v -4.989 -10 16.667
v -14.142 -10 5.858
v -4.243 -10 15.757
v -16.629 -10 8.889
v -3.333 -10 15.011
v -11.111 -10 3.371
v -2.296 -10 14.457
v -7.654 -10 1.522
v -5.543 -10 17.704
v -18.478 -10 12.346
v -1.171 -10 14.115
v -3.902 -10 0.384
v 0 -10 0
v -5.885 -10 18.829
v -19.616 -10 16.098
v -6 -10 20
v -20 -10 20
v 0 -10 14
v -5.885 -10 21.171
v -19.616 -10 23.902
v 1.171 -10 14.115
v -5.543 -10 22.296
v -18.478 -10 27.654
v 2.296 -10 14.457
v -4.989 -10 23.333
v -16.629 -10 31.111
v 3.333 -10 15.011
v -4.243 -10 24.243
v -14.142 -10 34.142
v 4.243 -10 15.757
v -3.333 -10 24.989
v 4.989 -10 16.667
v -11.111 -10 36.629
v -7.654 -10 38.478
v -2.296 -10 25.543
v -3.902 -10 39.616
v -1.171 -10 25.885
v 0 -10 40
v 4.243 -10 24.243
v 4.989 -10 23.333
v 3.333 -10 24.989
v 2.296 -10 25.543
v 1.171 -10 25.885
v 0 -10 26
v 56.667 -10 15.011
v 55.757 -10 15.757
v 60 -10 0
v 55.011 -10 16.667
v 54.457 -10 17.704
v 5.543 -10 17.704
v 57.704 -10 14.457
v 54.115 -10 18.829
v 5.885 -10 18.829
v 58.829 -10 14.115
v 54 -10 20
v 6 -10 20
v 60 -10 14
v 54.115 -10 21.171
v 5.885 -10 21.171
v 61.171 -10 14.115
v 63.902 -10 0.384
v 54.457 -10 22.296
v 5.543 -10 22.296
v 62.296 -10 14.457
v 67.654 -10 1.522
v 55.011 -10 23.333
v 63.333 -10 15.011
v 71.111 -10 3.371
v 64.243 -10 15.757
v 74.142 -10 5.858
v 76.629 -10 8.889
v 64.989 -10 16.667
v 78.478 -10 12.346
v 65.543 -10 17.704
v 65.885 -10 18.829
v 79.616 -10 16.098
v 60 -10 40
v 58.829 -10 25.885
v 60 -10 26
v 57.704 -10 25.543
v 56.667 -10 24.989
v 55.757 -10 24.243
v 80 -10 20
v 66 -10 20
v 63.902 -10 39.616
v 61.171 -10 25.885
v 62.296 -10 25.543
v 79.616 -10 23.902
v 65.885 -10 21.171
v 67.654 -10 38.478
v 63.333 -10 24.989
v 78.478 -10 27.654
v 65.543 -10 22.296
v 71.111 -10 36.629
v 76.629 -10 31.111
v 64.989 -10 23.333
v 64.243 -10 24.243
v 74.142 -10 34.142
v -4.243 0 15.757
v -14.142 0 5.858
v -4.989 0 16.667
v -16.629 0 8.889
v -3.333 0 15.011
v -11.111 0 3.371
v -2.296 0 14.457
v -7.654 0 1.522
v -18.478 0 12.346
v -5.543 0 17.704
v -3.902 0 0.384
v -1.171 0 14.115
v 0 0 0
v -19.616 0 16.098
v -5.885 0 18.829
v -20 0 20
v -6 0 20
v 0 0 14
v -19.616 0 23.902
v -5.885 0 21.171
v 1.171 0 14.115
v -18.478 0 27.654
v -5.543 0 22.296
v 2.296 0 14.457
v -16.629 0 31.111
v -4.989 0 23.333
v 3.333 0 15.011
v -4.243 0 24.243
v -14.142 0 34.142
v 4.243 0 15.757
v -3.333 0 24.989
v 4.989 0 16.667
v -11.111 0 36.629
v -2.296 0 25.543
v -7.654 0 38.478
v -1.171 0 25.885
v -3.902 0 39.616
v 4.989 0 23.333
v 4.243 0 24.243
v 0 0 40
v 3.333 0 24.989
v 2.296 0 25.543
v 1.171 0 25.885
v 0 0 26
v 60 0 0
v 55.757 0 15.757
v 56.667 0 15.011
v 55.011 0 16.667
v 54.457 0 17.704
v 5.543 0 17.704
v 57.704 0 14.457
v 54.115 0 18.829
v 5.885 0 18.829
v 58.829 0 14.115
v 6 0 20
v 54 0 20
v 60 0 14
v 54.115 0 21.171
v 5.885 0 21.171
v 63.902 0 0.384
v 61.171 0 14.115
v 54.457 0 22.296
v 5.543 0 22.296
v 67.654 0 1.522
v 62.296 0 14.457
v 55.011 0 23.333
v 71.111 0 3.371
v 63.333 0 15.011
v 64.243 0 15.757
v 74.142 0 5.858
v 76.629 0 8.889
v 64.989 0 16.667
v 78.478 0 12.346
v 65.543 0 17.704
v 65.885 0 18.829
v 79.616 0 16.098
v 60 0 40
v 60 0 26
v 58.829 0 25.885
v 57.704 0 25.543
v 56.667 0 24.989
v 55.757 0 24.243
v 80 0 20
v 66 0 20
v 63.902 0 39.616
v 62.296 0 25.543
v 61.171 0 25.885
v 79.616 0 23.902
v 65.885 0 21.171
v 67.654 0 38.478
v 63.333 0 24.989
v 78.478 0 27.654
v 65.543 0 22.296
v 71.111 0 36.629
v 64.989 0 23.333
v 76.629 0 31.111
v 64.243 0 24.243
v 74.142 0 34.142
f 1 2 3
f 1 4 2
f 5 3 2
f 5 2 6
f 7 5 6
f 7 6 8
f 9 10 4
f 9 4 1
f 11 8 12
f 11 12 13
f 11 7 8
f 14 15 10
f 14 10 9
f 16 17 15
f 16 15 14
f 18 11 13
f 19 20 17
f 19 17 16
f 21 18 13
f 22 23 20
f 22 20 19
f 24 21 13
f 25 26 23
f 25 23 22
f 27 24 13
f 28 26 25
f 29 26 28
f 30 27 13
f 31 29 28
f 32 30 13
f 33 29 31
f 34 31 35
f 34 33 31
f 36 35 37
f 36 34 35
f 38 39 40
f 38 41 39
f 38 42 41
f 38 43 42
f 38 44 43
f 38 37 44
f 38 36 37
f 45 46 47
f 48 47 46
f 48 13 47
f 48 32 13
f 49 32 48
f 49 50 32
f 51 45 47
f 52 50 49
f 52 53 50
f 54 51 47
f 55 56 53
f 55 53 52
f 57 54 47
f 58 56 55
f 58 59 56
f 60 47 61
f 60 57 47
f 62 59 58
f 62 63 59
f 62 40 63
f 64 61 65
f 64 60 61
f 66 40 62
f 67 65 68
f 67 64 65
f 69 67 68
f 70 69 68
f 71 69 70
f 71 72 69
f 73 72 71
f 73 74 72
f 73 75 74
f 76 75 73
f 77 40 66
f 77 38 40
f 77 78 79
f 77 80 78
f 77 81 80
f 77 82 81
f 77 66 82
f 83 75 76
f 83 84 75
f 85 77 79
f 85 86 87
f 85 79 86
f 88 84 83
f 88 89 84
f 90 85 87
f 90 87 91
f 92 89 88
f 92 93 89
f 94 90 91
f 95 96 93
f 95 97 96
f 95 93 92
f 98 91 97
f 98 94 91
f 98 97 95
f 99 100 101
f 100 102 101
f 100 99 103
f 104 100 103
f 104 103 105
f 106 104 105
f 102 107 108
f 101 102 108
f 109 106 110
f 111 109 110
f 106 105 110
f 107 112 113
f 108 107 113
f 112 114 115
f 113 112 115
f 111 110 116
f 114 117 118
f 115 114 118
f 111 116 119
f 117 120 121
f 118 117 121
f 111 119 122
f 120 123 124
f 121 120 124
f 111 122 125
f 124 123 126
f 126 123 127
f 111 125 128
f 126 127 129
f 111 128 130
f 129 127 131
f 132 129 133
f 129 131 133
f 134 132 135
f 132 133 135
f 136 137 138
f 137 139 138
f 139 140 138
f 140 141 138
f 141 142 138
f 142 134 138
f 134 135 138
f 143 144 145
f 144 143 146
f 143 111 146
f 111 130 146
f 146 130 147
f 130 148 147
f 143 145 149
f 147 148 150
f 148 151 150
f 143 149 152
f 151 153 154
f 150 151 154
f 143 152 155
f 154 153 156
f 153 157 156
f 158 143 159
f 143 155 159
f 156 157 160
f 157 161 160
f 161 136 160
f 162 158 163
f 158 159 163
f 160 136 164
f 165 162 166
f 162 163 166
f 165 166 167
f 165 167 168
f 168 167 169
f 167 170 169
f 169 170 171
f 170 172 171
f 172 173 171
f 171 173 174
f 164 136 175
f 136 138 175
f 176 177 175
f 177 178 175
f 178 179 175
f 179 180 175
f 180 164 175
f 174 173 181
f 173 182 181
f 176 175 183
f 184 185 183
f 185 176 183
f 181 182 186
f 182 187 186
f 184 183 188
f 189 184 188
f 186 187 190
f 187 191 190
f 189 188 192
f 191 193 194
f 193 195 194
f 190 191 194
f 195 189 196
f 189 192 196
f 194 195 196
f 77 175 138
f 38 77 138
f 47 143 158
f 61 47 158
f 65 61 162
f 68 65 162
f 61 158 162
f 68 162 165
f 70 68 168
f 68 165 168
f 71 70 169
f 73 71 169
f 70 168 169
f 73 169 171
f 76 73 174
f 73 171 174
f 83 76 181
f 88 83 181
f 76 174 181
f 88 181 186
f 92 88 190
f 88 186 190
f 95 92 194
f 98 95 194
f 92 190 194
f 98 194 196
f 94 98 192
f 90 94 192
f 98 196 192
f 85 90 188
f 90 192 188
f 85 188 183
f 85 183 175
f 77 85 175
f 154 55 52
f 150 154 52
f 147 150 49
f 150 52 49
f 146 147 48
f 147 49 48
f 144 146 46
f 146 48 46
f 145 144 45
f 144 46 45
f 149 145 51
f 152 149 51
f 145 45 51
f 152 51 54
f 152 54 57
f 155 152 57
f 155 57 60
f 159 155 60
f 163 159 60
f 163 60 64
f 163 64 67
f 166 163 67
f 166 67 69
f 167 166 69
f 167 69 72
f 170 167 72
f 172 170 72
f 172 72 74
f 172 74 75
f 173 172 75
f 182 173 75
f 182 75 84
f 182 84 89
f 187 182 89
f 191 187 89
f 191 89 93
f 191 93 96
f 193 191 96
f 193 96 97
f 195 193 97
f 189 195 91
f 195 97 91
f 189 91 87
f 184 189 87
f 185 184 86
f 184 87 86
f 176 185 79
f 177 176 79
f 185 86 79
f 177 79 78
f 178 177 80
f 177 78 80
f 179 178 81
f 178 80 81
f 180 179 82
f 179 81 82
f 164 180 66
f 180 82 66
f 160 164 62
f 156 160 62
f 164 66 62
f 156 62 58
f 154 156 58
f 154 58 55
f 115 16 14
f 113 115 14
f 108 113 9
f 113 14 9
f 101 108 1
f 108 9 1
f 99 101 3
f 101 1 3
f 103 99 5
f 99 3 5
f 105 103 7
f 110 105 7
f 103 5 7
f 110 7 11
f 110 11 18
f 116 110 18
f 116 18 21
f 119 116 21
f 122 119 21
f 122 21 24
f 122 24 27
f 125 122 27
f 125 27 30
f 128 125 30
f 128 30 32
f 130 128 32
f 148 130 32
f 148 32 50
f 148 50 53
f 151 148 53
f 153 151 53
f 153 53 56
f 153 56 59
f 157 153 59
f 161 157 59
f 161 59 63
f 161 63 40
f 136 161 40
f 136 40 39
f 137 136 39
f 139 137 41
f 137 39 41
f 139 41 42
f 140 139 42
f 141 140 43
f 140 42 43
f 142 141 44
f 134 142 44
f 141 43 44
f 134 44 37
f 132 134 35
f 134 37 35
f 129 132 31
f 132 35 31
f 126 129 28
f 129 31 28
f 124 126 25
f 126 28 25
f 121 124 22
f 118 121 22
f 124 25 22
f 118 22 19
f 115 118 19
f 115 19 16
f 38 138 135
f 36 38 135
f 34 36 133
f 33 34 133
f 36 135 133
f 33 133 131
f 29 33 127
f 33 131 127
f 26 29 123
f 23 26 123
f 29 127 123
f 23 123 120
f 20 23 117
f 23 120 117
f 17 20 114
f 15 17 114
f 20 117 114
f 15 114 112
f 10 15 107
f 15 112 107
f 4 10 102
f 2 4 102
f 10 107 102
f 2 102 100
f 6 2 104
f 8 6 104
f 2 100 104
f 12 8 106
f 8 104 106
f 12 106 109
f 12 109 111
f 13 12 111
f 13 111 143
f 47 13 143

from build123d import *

# Parameters (mm, degrees)
F1_DEPTH = 10
F2_D     = 12


with BuildPart() as f1:
    # F0 (on Front) → F1 (new body)
    with BuildSketch(Plane.XZ):
        with BuildLine():
            ThreePointArc((0, 40), (-20, 20), (0, 0))
            Line((0, 0), (60, 0))
            ThreePointArc((60, 0), (80, 20), (60, 40))
            Line((60, 40), (0, 40))
        make_face()
    extrude(amount=F1_DEPTH)

    # F2 (through all)
    with Locations(Plane(origin=(0, 0, 0), x_dir=(1, 0, 0), z_dir=(0, 1, 0))):
        with Locations((0, -20), (60, -20)):
            Hole(F2_D / 2)


solid = f1.part
